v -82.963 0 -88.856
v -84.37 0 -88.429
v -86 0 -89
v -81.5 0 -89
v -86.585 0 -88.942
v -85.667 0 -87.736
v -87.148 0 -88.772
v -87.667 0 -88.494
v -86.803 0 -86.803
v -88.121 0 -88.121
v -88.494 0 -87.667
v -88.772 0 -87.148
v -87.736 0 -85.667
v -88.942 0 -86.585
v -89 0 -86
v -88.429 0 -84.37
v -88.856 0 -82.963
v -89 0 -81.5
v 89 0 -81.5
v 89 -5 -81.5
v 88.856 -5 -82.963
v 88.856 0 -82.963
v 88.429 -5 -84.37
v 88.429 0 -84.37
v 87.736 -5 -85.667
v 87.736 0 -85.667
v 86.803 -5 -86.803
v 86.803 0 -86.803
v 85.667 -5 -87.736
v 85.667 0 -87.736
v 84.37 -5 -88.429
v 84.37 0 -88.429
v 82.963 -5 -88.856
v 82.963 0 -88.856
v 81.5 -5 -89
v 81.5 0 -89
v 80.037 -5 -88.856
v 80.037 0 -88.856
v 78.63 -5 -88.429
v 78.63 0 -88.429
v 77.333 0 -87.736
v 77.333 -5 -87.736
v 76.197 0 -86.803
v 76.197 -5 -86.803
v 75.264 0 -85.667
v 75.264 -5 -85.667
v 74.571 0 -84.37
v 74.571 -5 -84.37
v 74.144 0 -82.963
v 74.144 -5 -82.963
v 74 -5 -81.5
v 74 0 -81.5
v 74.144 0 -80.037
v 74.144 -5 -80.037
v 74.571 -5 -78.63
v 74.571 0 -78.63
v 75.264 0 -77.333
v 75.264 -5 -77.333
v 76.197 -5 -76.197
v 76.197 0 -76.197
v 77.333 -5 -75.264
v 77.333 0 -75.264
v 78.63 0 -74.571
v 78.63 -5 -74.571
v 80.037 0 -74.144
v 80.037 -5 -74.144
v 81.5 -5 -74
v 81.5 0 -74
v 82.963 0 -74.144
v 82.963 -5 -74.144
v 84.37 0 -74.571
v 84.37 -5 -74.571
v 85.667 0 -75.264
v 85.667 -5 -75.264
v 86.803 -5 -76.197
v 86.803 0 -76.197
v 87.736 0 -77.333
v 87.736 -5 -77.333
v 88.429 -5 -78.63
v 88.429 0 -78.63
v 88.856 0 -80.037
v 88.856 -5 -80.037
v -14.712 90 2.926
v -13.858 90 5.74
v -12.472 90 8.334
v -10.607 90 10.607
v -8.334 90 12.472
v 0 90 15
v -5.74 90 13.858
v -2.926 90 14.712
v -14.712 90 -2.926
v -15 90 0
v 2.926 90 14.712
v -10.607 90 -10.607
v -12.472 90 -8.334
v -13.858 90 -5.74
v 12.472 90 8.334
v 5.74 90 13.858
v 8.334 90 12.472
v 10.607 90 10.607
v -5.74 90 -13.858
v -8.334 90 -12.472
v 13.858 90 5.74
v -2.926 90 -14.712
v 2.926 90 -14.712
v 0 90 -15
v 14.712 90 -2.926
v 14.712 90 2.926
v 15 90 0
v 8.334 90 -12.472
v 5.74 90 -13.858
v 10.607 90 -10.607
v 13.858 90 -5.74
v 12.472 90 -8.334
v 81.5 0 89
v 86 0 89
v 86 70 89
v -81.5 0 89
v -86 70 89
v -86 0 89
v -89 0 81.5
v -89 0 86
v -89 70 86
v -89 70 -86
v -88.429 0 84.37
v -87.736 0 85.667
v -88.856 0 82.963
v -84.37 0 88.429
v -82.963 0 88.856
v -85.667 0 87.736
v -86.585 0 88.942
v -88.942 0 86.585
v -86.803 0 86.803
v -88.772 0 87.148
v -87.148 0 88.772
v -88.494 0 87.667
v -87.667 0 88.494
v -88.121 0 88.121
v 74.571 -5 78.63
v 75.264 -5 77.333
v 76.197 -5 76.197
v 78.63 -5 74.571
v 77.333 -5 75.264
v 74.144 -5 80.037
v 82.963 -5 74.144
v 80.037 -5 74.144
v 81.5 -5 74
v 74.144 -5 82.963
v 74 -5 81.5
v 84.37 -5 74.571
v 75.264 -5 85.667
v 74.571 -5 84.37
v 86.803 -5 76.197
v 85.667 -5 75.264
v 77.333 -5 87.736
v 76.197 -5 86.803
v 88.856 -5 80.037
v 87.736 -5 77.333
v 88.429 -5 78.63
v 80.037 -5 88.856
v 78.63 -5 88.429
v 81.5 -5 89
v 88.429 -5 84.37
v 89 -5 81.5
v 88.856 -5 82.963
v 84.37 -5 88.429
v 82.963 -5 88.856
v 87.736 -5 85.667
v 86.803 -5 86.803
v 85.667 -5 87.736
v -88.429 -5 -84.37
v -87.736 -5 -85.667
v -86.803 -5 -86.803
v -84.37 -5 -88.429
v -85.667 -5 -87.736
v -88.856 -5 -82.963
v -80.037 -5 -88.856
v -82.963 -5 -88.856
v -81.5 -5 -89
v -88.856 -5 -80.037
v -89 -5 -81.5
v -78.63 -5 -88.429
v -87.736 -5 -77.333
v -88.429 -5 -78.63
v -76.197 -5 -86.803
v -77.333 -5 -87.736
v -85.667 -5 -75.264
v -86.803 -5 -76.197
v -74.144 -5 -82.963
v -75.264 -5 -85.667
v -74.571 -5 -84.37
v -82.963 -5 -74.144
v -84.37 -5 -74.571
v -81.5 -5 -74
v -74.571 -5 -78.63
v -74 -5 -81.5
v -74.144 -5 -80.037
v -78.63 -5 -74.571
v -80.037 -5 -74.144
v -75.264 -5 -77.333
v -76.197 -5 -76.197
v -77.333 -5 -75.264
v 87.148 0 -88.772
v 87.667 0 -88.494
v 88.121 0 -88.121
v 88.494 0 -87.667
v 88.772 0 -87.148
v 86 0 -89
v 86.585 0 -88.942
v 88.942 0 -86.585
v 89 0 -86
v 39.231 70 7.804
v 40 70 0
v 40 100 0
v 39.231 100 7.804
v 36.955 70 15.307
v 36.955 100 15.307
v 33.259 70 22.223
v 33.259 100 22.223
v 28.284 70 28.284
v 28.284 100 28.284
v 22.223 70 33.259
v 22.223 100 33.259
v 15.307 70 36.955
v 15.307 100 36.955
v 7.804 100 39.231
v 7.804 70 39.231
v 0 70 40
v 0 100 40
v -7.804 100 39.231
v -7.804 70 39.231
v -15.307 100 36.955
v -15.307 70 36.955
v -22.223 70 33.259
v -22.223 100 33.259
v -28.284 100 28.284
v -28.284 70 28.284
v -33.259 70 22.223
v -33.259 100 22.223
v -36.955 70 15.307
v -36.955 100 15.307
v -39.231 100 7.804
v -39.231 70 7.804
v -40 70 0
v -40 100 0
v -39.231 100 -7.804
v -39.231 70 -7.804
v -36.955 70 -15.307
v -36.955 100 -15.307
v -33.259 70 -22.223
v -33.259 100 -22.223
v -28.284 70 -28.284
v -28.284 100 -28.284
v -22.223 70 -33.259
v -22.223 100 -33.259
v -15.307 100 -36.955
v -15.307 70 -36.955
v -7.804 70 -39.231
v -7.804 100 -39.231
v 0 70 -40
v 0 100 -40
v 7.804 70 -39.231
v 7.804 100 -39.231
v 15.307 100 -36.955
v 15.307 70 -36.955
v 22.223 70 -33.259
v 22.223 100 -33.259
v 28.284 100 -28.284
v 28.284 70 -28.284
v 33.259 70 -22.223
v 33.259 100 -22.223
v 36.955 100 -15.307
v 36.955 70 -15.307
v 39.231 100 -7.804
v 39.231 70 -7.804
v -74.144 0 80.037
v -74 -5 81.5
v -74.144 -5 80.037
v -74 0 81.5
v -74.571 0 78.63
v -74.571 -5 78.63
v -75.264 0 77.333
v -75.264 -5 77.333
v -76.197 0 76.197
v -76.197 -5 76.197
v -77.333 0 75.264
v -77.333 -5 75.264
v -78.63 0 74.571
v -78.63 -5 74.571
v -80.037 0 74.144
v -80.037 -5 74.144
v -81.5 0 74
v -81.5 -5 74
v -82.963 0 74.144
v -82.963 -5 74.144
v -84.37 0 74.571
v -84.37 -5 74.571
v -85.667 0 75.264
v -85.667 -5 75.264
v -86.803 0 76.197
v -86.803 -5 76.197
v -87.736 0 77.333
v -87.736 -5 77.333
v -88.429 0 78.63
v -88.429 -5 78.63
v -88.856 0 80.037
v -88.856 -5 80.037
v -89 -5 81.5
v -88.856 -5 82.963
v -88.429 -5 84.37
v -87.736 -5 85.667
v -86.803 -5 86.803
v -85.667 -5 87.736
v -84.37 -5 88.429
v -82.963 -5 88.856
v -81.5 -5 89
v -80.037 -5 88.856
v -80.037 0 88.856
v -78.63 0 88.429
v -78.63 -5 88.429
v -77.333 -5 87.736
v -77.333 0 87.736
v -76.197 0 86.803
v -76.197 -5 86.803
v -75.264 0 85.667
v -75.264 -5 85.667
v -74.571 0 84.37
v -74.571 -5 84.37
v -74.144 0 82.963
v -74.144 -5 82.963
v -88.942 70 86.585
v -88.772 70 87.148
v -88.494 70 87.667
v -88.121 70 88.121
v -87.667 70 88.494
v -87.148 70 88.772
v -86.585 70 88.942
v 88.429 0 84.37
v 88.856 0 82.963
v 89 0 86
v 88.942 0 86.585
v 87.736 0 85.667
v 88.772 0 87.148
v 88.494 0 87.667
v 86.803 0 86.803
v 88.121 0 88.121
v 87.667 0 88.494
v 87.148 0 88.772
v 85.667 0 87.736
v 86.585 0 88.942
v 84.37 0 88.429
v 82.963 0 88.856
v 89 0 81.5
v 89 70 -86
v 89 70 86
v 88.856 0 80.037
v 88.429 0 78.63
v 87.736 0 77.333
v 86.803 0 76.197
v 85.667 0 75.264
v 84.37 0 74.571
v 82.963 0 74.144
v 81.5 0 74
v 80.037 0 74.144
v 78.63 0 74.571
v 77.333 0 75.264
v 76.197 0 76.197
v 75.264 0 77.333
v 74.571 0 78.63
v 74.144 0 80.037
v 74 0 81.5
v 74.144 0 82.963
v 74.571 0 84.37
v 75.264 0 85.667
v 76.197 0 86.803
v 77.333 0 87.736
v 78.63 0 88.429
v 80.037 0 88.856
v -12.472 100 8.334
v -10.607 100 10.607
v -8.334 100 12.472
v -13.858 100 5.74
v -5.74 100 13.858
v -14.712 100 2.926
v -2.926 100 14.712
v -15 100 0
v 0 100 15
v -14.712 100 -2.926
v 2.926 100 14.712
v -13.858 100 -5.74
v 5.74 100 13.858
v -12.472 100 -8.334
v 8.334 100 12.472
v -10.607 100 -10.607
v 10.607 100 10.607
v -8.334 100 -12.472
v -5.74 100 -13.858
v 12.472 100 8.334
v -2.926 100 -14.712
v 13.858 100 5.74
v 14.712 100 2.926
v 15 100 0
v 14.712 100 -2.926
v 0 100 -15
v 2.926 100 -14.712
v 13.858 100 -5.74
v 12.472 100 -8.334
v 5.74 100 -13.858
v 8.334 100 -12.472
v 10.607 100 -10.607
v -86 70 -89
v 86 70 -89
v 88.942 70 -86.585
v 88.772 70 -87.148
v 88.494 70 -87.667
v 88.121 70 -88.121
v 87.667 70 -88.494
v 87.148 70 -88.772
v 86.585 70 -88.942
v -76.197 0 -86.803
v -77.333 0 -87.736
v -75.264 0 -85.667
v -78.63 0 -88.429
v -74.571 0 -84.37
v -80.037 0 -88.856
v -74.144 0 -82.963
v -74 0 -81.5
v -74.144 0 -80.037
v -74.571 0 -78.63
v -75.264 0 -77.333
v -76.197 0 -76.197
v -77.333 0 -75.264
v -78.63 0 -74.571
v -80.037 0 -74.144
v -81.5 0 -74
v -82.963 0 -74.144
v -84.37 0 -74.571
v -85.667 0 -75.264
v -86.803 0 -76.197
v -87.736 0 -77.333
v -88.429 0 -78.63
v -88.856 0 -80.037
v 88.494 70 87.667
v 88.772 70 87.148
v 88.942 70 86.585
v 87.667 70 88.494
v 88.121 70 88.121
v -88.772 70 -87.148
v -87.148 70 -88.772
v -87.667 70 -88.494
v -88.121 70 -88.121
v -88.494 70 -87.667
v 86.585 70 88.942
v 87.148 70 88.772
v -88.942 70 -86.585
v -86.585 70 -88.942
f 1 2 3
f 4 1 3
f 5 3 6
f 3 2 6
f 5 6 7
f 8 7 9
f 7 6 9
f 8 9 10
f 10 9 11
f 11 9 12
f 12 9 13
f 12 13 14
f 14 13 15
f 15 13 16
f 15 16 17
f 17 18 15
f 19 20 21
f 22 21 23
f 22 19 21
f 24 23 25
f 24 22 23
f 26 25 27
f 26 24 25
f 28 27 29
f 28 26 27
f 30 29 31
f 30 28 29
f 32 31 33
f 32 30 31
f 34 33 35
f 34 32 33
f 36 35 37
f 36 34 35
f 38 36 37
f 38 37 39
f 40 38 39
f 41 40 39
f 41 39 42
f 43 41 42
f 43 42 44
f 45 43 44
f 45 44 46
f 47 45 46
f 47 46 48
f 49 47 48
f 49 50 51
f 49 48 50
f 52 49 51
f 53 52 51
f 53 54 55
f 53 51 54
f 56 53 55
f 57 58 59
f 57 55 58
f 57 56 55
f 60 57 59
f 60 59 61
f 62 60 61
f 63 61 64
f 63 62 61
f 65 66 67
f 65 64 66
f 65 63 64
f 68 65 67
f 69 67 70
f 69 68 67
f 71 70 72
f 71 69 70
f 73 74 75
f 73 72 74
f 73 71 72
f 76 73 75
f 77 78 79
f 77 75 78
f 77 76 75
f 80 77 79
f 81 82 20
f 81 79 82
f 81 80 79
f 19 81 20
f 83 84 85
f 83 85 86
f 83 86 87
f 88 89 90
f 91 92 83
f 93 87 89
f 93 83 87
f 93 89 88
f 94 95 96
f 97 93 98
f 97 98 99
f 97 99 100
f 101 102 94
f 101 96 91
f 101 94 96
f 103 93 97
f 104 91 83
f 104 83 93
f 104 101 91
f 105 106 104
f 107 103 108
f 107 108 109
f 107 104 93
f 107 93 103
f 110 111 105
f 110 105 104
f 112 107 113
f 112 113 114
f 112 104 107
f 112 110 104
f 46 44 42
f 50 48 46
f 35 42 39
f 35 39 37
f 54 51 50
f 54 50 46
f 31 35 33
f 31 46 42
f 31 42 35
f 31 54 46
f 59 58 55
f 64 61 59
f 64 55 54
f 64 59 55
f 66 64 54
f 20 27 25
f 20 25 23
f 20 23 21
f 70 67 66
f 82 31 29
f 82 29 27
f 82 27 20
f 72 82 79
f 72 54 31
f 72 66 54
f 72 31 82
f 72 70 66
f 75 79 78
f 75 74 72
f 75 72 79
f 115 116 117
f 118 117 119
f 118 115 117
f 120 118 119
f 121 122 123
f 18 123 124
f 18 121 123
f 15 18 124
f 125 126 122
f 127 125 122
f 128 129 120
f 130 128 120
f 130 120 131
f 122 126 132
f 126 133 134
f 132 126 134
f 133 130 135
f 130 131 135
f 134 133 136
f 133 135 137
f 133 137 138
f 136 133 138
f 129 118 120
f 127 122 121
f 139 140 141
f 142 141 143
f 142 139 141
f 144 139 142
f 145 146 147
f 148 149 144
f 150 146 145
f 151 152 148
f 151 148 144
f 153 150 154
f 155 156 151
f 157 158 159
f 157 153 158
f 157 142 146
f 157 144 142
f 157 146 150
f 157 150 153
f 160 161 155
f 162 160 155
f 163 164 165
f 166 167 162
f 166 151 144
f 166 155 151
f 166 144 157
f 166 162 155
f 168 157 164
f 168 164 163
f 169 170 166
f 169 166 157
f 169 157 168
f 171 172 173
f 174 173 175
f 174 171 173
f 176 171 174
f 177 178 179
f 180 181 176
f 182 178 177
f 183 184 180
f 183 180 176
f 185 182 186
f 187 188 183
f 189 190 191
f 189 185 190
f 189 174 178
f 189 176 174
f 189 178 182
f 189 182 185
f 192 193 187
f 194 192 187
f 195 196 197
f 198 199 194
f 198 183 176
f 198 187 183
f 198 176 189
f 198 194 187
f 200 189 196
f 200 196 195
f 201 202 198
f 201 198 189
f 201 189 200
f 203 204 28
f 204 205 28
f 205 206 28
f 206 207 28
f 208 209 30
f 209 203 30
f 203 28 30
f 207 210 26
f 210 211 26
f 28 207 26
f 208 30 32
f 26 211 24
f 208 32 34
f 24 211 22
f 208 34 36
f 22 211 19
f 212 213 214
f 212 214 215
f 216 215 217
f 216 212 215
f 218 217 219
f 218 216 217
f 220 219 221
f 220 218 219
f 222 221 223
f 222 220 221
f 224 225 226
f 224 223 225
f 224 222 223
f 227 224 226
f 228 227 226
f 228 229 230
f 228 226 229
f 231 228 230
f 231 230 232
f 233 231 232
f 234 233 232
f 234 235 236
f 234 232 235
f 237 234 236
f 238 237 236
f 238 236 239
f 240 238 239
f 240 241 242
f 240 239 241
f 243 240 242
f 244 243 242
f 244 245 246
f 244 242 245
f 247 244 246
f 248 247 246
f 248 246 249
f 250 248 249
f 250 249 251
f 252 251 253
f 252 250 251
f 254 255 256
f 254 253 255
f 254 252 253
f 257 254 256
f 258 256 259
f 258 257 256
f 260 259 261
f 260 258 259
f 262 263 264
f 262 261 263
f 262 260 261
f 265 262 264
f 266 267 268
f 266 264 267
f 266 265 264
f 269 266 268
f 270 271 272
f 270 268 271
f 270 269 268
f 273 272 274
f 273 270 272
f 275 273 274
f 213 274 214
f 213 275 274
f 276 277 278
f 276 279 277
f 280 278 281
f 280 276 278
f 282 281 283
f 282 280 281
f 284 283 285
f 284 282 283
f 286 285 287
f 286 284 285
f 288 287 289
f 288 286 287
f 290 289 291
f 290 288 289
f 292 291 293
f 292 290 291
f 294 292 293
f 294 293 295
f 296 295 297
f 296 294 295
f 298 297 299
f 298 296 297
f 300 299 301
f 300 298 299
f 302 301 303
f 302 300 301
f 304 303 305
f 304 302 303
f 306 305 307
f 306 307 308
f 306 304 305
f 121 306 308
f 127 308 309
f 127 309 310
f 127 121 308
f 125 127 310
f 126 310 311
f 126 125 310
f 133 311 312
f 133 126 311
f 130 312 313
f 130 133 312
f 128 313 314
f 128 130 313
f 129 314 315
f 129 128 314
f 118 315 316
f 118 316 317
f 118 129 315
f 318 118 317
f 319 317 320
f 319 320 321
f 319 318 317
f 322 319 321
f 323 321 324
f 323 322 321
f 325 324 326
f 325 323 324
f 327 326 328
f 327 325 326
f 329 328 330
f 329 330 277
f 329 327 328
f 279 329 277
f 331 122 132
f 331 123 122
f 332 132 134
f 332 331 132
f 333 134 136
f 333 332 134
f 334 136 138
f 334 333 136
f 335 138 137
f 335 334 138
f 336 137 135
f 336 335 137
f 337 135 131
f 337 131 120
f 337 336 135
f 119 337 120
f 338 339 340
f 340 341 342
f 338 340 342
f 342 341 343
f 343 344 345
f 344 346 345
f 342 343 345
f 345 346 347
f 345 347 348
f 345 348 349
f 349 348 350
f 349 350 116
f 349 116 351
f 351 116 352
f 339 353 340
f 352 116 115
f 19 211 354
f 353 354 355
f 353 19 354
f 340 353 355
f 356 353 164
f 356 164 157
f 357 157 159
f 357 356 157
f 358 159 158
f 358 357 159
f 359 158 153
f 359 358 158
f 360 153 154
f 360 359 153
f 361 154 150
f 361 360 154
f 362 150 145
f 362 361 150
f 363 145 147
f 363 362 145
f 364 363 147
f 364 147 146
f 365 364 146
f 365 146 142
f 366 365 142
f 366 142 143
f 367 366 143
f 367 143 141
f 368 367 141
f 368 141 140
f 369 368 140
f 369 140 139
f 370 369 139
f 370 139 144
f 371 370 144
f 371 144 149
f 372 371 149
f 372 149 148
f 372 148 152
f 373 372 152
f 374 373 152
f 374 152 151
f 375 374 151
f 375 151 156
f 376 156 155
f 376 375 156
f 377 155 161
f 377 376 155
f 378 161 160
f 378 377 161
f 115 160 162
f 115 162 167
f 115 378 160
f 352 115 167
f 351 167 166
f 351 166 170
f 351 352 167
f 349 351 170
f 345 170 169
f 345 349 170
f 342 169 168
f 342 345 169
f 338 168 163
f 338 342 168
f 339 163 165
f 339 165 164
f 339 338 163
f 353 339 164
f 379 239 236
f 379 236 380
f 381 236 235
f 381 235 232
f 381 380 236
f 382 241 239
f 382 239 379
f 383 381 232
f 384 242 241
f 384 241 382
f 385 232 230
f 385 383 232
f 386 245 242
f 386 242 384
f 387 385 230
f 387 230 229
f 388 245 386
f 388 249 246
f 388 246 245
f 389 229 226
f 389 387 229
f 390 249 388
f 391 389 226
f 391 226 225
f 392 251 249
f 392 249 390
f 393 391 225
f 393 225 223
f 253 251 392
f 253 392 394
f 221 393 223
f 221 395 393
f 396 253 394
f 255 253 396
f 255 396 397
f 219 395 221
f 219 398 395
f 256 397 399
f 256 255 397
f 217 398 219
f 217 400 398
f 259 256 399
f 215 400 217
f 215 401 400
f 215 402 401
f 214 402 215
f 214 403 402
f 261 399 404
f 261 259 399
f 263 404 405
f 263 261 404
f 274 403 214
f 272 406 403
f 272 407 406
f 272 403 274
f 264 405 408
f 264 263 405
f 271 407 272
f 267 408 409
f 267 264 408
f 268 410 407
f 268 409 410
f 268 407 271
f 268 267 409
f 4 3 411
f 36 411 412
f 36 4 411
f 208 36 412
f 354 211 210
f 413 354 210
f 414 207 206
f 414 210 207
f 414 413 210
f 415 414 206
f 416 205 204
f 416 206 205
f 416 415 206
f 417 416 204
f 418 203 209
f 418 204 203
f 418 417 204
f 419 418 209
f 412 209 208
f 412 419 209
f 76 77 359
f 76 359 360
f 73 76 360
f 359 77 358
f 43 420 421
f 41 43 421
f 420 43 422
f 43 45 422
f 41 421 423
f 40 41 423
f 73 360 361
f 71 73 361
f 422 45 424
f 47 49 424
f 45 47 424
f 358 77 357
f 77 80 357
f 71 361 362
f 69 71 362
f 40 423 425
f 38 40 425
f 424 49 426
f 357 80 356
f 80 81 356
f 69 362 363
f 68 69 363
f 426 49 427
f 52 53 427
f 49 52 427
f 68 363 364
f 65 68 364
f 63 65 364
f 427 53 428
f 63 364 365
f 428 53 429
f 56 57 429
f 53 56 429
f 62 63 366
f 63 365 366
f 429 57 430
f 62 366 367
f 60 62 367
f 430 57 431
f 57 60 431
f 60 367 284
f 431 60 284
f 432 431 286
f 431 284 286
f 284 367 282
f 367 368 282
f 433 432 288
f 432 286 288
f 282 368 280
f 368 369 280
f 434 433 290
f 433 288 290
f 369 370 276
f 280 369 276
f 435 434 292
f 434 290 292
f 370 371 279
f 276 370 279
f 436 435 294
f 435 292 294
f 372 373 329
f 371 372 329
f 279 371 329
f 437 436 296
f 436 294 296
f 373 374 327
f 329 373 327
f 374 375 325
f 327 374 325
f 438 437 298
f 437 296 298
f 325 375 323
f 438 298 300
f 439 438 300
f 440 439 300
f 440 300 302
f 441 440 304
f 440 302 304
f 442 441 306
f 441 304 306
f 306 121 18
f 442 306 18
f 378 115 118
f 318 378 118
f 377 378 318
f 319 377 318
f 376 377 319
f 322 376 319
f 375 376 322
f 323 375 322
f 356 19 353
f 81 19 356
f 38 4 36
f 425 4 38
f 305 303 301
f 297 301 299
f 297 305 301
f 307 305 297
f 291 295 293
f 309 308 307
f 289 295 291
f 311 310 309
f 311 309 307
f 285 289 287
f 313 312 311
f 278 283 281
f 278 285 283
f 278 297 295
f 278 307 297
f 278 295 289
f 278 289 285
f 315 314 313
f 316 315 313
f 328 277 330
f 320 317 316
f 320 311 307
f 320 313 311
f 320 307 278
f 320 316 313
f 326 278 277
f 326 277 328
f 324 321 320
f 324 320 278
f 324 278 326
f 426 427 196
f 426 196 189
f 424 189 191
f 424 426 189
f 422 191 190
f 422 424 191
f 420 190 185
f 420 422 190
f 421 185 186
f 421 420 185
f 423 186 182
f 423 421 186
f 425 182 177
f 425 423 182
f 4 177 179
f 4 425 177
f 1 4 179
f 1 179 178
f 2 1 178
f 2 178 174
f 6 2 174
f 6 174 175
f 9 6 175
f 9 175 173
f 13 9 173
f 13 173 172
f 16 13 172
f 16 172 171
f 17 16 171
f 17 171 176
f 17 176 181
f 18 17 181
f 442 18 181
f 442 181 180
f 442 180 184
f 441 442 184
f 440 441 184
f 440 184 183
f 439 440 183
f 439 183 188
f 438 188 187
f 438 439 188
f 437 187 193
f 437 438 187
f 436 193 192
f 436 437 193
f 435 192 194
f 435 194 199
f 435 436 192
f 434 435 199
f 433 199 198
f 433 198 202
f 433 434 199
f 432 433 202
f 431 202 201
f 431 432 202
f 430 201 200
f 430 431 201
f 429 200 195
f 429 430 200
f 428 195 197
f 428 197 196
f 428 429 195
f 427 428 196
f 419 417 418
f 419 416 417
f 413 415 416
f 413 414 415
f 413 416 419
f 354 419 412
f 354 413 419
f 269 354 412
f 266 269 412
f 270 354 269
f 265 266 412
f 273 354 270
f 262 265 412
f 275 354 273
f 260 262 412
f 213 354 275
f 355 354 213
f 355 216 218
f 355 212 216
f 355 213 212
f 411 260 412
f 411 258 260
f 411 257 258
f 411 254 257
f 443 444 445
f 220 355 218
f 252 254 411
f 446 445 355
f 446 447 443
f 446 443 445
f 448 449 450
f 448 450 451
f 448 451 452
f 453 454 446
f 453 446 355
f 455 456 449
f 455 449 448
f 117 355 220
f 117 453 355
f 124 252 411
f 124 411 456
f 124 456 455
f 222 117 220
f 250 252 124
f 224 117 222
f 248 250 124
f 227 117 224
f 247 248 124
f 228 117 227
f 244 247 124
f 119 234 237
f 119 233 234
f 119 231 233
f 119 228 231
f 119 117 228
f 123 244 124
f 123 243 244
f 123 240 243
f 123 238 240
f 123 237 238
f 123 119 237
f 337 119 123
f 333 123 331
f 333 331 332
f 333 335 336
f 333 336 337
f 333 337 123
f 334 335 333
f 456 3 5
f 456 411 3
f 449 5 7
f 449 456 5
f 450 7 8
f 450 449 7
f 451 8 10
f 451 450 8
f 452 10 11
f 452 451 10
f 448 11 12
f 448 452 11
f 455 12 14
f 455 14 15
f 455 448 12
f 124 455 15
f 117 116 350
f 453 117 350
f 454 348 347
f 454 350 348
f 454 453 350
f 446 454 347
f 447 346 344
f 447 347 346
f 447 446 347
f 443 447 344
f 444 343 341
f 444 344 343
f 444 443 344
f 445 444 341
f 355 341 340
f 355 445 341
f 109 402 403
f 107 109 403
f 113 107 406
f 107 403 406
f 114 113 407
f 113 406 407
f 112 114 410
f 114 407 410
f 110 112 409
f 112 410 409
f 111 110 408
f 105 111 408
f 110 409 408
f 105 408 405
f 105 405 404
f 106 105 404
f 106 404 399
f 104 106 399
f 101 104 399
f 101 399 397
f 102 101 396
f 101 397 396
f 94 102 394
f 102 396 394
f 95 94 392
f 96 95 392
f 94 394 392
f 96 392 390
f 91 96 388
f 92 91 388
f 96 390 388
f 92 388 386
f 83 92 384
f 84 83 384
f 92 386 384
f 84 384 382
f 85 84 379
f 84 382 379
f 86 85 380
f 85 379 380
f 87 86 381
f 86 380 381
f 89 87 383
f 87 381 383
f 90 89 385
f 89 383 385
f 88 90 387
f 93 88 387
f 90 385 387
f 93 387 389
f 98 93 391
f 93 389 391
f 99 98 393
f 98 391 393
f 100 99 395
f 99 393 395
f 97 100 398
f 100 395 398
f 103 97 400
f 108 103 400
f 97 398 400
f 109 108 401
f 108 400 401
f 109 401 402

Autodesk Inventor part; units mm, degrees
ref_plane "YZ Plane" through (0, 0, 0) normal (1, 0, 0) x (0, 1, 0)
ref_plane "XZ Plane" through (0, 0, 0) normal (0, 1, 0) x (-1, 0, 0)
ref_plane "XY Plane" through (0, 0, 0) normal (0, 0, 1) x (1, 0, 0)
sketch "Sketch1" plane through (0, 0, 0) normal (0, 1, 0) x (-1, 0, 0)
  line L0 (89, -89) -> (-89, -89)
  line L1 (-89, -89) -> (-89, 89)
  line L2 (-89, 89) -> (89, 89)
  line L3 (89, 89) -> (89, -89)
  point P0 (0, 0)
  dimension "d0" = 89
  dimension "d1" = 178
  dimension "d2" = 178
  dimension "d3" = 89
extrude "Extrusion1" add sketch "Sketch1" along normal blind 70
sketch "Sketch2" plane through (0, 70, 0) normal (0, 1, 0) x (1, 0, 0)
  circle A0 centre (0, 0) radius 40
  dimension "d6" = 80
extrude "Extrusion2" add sketch "Sketch2" along normal blind 30
sketch "Sketch3" plane through (0, 100, 0) normal (0, 1, 0) x (1, 0, 0)
  circle A0 centre (0, 0) radius 15
  dimension "d9" = 30
extrude "Extrusion3" cut sketch "Sketch3" against normal blind 10
sketch "Sketch4" plane through (0, 0, 0) normal (0, -1, 0) x (1, 0, 0)
  circle A0 centre (-81.5, 81.5) radius 7.5
  line L0 (-89, 89) -> (89, 89) projected
  line L1 (-89, -89) -> (-89, 89) projected
  circle A1 centre (-81.5, -81.5) radius 7.5
  circle A2 centre (81.5, -81.5) radius 7.5
  circle A3 centre (81.5, 81.5) radius 7.5
  point P0 (0, 0)
  dimension "d12" = 15
  dimension "d13" = 7.5
  dimension "d14" = 7.5
  dimension "d17" = 360
extrude "Extrusion4" add sketch "Sketch4" along normal blind 5 contours A0 | A1 | A3 | A2
fillet "Fillet1" radius 3 4 edges at (-89, 35, 89) (89, 35, 89) (-89, 35, -89) (89, 35, -89)
properties part number "AERO - Base"
